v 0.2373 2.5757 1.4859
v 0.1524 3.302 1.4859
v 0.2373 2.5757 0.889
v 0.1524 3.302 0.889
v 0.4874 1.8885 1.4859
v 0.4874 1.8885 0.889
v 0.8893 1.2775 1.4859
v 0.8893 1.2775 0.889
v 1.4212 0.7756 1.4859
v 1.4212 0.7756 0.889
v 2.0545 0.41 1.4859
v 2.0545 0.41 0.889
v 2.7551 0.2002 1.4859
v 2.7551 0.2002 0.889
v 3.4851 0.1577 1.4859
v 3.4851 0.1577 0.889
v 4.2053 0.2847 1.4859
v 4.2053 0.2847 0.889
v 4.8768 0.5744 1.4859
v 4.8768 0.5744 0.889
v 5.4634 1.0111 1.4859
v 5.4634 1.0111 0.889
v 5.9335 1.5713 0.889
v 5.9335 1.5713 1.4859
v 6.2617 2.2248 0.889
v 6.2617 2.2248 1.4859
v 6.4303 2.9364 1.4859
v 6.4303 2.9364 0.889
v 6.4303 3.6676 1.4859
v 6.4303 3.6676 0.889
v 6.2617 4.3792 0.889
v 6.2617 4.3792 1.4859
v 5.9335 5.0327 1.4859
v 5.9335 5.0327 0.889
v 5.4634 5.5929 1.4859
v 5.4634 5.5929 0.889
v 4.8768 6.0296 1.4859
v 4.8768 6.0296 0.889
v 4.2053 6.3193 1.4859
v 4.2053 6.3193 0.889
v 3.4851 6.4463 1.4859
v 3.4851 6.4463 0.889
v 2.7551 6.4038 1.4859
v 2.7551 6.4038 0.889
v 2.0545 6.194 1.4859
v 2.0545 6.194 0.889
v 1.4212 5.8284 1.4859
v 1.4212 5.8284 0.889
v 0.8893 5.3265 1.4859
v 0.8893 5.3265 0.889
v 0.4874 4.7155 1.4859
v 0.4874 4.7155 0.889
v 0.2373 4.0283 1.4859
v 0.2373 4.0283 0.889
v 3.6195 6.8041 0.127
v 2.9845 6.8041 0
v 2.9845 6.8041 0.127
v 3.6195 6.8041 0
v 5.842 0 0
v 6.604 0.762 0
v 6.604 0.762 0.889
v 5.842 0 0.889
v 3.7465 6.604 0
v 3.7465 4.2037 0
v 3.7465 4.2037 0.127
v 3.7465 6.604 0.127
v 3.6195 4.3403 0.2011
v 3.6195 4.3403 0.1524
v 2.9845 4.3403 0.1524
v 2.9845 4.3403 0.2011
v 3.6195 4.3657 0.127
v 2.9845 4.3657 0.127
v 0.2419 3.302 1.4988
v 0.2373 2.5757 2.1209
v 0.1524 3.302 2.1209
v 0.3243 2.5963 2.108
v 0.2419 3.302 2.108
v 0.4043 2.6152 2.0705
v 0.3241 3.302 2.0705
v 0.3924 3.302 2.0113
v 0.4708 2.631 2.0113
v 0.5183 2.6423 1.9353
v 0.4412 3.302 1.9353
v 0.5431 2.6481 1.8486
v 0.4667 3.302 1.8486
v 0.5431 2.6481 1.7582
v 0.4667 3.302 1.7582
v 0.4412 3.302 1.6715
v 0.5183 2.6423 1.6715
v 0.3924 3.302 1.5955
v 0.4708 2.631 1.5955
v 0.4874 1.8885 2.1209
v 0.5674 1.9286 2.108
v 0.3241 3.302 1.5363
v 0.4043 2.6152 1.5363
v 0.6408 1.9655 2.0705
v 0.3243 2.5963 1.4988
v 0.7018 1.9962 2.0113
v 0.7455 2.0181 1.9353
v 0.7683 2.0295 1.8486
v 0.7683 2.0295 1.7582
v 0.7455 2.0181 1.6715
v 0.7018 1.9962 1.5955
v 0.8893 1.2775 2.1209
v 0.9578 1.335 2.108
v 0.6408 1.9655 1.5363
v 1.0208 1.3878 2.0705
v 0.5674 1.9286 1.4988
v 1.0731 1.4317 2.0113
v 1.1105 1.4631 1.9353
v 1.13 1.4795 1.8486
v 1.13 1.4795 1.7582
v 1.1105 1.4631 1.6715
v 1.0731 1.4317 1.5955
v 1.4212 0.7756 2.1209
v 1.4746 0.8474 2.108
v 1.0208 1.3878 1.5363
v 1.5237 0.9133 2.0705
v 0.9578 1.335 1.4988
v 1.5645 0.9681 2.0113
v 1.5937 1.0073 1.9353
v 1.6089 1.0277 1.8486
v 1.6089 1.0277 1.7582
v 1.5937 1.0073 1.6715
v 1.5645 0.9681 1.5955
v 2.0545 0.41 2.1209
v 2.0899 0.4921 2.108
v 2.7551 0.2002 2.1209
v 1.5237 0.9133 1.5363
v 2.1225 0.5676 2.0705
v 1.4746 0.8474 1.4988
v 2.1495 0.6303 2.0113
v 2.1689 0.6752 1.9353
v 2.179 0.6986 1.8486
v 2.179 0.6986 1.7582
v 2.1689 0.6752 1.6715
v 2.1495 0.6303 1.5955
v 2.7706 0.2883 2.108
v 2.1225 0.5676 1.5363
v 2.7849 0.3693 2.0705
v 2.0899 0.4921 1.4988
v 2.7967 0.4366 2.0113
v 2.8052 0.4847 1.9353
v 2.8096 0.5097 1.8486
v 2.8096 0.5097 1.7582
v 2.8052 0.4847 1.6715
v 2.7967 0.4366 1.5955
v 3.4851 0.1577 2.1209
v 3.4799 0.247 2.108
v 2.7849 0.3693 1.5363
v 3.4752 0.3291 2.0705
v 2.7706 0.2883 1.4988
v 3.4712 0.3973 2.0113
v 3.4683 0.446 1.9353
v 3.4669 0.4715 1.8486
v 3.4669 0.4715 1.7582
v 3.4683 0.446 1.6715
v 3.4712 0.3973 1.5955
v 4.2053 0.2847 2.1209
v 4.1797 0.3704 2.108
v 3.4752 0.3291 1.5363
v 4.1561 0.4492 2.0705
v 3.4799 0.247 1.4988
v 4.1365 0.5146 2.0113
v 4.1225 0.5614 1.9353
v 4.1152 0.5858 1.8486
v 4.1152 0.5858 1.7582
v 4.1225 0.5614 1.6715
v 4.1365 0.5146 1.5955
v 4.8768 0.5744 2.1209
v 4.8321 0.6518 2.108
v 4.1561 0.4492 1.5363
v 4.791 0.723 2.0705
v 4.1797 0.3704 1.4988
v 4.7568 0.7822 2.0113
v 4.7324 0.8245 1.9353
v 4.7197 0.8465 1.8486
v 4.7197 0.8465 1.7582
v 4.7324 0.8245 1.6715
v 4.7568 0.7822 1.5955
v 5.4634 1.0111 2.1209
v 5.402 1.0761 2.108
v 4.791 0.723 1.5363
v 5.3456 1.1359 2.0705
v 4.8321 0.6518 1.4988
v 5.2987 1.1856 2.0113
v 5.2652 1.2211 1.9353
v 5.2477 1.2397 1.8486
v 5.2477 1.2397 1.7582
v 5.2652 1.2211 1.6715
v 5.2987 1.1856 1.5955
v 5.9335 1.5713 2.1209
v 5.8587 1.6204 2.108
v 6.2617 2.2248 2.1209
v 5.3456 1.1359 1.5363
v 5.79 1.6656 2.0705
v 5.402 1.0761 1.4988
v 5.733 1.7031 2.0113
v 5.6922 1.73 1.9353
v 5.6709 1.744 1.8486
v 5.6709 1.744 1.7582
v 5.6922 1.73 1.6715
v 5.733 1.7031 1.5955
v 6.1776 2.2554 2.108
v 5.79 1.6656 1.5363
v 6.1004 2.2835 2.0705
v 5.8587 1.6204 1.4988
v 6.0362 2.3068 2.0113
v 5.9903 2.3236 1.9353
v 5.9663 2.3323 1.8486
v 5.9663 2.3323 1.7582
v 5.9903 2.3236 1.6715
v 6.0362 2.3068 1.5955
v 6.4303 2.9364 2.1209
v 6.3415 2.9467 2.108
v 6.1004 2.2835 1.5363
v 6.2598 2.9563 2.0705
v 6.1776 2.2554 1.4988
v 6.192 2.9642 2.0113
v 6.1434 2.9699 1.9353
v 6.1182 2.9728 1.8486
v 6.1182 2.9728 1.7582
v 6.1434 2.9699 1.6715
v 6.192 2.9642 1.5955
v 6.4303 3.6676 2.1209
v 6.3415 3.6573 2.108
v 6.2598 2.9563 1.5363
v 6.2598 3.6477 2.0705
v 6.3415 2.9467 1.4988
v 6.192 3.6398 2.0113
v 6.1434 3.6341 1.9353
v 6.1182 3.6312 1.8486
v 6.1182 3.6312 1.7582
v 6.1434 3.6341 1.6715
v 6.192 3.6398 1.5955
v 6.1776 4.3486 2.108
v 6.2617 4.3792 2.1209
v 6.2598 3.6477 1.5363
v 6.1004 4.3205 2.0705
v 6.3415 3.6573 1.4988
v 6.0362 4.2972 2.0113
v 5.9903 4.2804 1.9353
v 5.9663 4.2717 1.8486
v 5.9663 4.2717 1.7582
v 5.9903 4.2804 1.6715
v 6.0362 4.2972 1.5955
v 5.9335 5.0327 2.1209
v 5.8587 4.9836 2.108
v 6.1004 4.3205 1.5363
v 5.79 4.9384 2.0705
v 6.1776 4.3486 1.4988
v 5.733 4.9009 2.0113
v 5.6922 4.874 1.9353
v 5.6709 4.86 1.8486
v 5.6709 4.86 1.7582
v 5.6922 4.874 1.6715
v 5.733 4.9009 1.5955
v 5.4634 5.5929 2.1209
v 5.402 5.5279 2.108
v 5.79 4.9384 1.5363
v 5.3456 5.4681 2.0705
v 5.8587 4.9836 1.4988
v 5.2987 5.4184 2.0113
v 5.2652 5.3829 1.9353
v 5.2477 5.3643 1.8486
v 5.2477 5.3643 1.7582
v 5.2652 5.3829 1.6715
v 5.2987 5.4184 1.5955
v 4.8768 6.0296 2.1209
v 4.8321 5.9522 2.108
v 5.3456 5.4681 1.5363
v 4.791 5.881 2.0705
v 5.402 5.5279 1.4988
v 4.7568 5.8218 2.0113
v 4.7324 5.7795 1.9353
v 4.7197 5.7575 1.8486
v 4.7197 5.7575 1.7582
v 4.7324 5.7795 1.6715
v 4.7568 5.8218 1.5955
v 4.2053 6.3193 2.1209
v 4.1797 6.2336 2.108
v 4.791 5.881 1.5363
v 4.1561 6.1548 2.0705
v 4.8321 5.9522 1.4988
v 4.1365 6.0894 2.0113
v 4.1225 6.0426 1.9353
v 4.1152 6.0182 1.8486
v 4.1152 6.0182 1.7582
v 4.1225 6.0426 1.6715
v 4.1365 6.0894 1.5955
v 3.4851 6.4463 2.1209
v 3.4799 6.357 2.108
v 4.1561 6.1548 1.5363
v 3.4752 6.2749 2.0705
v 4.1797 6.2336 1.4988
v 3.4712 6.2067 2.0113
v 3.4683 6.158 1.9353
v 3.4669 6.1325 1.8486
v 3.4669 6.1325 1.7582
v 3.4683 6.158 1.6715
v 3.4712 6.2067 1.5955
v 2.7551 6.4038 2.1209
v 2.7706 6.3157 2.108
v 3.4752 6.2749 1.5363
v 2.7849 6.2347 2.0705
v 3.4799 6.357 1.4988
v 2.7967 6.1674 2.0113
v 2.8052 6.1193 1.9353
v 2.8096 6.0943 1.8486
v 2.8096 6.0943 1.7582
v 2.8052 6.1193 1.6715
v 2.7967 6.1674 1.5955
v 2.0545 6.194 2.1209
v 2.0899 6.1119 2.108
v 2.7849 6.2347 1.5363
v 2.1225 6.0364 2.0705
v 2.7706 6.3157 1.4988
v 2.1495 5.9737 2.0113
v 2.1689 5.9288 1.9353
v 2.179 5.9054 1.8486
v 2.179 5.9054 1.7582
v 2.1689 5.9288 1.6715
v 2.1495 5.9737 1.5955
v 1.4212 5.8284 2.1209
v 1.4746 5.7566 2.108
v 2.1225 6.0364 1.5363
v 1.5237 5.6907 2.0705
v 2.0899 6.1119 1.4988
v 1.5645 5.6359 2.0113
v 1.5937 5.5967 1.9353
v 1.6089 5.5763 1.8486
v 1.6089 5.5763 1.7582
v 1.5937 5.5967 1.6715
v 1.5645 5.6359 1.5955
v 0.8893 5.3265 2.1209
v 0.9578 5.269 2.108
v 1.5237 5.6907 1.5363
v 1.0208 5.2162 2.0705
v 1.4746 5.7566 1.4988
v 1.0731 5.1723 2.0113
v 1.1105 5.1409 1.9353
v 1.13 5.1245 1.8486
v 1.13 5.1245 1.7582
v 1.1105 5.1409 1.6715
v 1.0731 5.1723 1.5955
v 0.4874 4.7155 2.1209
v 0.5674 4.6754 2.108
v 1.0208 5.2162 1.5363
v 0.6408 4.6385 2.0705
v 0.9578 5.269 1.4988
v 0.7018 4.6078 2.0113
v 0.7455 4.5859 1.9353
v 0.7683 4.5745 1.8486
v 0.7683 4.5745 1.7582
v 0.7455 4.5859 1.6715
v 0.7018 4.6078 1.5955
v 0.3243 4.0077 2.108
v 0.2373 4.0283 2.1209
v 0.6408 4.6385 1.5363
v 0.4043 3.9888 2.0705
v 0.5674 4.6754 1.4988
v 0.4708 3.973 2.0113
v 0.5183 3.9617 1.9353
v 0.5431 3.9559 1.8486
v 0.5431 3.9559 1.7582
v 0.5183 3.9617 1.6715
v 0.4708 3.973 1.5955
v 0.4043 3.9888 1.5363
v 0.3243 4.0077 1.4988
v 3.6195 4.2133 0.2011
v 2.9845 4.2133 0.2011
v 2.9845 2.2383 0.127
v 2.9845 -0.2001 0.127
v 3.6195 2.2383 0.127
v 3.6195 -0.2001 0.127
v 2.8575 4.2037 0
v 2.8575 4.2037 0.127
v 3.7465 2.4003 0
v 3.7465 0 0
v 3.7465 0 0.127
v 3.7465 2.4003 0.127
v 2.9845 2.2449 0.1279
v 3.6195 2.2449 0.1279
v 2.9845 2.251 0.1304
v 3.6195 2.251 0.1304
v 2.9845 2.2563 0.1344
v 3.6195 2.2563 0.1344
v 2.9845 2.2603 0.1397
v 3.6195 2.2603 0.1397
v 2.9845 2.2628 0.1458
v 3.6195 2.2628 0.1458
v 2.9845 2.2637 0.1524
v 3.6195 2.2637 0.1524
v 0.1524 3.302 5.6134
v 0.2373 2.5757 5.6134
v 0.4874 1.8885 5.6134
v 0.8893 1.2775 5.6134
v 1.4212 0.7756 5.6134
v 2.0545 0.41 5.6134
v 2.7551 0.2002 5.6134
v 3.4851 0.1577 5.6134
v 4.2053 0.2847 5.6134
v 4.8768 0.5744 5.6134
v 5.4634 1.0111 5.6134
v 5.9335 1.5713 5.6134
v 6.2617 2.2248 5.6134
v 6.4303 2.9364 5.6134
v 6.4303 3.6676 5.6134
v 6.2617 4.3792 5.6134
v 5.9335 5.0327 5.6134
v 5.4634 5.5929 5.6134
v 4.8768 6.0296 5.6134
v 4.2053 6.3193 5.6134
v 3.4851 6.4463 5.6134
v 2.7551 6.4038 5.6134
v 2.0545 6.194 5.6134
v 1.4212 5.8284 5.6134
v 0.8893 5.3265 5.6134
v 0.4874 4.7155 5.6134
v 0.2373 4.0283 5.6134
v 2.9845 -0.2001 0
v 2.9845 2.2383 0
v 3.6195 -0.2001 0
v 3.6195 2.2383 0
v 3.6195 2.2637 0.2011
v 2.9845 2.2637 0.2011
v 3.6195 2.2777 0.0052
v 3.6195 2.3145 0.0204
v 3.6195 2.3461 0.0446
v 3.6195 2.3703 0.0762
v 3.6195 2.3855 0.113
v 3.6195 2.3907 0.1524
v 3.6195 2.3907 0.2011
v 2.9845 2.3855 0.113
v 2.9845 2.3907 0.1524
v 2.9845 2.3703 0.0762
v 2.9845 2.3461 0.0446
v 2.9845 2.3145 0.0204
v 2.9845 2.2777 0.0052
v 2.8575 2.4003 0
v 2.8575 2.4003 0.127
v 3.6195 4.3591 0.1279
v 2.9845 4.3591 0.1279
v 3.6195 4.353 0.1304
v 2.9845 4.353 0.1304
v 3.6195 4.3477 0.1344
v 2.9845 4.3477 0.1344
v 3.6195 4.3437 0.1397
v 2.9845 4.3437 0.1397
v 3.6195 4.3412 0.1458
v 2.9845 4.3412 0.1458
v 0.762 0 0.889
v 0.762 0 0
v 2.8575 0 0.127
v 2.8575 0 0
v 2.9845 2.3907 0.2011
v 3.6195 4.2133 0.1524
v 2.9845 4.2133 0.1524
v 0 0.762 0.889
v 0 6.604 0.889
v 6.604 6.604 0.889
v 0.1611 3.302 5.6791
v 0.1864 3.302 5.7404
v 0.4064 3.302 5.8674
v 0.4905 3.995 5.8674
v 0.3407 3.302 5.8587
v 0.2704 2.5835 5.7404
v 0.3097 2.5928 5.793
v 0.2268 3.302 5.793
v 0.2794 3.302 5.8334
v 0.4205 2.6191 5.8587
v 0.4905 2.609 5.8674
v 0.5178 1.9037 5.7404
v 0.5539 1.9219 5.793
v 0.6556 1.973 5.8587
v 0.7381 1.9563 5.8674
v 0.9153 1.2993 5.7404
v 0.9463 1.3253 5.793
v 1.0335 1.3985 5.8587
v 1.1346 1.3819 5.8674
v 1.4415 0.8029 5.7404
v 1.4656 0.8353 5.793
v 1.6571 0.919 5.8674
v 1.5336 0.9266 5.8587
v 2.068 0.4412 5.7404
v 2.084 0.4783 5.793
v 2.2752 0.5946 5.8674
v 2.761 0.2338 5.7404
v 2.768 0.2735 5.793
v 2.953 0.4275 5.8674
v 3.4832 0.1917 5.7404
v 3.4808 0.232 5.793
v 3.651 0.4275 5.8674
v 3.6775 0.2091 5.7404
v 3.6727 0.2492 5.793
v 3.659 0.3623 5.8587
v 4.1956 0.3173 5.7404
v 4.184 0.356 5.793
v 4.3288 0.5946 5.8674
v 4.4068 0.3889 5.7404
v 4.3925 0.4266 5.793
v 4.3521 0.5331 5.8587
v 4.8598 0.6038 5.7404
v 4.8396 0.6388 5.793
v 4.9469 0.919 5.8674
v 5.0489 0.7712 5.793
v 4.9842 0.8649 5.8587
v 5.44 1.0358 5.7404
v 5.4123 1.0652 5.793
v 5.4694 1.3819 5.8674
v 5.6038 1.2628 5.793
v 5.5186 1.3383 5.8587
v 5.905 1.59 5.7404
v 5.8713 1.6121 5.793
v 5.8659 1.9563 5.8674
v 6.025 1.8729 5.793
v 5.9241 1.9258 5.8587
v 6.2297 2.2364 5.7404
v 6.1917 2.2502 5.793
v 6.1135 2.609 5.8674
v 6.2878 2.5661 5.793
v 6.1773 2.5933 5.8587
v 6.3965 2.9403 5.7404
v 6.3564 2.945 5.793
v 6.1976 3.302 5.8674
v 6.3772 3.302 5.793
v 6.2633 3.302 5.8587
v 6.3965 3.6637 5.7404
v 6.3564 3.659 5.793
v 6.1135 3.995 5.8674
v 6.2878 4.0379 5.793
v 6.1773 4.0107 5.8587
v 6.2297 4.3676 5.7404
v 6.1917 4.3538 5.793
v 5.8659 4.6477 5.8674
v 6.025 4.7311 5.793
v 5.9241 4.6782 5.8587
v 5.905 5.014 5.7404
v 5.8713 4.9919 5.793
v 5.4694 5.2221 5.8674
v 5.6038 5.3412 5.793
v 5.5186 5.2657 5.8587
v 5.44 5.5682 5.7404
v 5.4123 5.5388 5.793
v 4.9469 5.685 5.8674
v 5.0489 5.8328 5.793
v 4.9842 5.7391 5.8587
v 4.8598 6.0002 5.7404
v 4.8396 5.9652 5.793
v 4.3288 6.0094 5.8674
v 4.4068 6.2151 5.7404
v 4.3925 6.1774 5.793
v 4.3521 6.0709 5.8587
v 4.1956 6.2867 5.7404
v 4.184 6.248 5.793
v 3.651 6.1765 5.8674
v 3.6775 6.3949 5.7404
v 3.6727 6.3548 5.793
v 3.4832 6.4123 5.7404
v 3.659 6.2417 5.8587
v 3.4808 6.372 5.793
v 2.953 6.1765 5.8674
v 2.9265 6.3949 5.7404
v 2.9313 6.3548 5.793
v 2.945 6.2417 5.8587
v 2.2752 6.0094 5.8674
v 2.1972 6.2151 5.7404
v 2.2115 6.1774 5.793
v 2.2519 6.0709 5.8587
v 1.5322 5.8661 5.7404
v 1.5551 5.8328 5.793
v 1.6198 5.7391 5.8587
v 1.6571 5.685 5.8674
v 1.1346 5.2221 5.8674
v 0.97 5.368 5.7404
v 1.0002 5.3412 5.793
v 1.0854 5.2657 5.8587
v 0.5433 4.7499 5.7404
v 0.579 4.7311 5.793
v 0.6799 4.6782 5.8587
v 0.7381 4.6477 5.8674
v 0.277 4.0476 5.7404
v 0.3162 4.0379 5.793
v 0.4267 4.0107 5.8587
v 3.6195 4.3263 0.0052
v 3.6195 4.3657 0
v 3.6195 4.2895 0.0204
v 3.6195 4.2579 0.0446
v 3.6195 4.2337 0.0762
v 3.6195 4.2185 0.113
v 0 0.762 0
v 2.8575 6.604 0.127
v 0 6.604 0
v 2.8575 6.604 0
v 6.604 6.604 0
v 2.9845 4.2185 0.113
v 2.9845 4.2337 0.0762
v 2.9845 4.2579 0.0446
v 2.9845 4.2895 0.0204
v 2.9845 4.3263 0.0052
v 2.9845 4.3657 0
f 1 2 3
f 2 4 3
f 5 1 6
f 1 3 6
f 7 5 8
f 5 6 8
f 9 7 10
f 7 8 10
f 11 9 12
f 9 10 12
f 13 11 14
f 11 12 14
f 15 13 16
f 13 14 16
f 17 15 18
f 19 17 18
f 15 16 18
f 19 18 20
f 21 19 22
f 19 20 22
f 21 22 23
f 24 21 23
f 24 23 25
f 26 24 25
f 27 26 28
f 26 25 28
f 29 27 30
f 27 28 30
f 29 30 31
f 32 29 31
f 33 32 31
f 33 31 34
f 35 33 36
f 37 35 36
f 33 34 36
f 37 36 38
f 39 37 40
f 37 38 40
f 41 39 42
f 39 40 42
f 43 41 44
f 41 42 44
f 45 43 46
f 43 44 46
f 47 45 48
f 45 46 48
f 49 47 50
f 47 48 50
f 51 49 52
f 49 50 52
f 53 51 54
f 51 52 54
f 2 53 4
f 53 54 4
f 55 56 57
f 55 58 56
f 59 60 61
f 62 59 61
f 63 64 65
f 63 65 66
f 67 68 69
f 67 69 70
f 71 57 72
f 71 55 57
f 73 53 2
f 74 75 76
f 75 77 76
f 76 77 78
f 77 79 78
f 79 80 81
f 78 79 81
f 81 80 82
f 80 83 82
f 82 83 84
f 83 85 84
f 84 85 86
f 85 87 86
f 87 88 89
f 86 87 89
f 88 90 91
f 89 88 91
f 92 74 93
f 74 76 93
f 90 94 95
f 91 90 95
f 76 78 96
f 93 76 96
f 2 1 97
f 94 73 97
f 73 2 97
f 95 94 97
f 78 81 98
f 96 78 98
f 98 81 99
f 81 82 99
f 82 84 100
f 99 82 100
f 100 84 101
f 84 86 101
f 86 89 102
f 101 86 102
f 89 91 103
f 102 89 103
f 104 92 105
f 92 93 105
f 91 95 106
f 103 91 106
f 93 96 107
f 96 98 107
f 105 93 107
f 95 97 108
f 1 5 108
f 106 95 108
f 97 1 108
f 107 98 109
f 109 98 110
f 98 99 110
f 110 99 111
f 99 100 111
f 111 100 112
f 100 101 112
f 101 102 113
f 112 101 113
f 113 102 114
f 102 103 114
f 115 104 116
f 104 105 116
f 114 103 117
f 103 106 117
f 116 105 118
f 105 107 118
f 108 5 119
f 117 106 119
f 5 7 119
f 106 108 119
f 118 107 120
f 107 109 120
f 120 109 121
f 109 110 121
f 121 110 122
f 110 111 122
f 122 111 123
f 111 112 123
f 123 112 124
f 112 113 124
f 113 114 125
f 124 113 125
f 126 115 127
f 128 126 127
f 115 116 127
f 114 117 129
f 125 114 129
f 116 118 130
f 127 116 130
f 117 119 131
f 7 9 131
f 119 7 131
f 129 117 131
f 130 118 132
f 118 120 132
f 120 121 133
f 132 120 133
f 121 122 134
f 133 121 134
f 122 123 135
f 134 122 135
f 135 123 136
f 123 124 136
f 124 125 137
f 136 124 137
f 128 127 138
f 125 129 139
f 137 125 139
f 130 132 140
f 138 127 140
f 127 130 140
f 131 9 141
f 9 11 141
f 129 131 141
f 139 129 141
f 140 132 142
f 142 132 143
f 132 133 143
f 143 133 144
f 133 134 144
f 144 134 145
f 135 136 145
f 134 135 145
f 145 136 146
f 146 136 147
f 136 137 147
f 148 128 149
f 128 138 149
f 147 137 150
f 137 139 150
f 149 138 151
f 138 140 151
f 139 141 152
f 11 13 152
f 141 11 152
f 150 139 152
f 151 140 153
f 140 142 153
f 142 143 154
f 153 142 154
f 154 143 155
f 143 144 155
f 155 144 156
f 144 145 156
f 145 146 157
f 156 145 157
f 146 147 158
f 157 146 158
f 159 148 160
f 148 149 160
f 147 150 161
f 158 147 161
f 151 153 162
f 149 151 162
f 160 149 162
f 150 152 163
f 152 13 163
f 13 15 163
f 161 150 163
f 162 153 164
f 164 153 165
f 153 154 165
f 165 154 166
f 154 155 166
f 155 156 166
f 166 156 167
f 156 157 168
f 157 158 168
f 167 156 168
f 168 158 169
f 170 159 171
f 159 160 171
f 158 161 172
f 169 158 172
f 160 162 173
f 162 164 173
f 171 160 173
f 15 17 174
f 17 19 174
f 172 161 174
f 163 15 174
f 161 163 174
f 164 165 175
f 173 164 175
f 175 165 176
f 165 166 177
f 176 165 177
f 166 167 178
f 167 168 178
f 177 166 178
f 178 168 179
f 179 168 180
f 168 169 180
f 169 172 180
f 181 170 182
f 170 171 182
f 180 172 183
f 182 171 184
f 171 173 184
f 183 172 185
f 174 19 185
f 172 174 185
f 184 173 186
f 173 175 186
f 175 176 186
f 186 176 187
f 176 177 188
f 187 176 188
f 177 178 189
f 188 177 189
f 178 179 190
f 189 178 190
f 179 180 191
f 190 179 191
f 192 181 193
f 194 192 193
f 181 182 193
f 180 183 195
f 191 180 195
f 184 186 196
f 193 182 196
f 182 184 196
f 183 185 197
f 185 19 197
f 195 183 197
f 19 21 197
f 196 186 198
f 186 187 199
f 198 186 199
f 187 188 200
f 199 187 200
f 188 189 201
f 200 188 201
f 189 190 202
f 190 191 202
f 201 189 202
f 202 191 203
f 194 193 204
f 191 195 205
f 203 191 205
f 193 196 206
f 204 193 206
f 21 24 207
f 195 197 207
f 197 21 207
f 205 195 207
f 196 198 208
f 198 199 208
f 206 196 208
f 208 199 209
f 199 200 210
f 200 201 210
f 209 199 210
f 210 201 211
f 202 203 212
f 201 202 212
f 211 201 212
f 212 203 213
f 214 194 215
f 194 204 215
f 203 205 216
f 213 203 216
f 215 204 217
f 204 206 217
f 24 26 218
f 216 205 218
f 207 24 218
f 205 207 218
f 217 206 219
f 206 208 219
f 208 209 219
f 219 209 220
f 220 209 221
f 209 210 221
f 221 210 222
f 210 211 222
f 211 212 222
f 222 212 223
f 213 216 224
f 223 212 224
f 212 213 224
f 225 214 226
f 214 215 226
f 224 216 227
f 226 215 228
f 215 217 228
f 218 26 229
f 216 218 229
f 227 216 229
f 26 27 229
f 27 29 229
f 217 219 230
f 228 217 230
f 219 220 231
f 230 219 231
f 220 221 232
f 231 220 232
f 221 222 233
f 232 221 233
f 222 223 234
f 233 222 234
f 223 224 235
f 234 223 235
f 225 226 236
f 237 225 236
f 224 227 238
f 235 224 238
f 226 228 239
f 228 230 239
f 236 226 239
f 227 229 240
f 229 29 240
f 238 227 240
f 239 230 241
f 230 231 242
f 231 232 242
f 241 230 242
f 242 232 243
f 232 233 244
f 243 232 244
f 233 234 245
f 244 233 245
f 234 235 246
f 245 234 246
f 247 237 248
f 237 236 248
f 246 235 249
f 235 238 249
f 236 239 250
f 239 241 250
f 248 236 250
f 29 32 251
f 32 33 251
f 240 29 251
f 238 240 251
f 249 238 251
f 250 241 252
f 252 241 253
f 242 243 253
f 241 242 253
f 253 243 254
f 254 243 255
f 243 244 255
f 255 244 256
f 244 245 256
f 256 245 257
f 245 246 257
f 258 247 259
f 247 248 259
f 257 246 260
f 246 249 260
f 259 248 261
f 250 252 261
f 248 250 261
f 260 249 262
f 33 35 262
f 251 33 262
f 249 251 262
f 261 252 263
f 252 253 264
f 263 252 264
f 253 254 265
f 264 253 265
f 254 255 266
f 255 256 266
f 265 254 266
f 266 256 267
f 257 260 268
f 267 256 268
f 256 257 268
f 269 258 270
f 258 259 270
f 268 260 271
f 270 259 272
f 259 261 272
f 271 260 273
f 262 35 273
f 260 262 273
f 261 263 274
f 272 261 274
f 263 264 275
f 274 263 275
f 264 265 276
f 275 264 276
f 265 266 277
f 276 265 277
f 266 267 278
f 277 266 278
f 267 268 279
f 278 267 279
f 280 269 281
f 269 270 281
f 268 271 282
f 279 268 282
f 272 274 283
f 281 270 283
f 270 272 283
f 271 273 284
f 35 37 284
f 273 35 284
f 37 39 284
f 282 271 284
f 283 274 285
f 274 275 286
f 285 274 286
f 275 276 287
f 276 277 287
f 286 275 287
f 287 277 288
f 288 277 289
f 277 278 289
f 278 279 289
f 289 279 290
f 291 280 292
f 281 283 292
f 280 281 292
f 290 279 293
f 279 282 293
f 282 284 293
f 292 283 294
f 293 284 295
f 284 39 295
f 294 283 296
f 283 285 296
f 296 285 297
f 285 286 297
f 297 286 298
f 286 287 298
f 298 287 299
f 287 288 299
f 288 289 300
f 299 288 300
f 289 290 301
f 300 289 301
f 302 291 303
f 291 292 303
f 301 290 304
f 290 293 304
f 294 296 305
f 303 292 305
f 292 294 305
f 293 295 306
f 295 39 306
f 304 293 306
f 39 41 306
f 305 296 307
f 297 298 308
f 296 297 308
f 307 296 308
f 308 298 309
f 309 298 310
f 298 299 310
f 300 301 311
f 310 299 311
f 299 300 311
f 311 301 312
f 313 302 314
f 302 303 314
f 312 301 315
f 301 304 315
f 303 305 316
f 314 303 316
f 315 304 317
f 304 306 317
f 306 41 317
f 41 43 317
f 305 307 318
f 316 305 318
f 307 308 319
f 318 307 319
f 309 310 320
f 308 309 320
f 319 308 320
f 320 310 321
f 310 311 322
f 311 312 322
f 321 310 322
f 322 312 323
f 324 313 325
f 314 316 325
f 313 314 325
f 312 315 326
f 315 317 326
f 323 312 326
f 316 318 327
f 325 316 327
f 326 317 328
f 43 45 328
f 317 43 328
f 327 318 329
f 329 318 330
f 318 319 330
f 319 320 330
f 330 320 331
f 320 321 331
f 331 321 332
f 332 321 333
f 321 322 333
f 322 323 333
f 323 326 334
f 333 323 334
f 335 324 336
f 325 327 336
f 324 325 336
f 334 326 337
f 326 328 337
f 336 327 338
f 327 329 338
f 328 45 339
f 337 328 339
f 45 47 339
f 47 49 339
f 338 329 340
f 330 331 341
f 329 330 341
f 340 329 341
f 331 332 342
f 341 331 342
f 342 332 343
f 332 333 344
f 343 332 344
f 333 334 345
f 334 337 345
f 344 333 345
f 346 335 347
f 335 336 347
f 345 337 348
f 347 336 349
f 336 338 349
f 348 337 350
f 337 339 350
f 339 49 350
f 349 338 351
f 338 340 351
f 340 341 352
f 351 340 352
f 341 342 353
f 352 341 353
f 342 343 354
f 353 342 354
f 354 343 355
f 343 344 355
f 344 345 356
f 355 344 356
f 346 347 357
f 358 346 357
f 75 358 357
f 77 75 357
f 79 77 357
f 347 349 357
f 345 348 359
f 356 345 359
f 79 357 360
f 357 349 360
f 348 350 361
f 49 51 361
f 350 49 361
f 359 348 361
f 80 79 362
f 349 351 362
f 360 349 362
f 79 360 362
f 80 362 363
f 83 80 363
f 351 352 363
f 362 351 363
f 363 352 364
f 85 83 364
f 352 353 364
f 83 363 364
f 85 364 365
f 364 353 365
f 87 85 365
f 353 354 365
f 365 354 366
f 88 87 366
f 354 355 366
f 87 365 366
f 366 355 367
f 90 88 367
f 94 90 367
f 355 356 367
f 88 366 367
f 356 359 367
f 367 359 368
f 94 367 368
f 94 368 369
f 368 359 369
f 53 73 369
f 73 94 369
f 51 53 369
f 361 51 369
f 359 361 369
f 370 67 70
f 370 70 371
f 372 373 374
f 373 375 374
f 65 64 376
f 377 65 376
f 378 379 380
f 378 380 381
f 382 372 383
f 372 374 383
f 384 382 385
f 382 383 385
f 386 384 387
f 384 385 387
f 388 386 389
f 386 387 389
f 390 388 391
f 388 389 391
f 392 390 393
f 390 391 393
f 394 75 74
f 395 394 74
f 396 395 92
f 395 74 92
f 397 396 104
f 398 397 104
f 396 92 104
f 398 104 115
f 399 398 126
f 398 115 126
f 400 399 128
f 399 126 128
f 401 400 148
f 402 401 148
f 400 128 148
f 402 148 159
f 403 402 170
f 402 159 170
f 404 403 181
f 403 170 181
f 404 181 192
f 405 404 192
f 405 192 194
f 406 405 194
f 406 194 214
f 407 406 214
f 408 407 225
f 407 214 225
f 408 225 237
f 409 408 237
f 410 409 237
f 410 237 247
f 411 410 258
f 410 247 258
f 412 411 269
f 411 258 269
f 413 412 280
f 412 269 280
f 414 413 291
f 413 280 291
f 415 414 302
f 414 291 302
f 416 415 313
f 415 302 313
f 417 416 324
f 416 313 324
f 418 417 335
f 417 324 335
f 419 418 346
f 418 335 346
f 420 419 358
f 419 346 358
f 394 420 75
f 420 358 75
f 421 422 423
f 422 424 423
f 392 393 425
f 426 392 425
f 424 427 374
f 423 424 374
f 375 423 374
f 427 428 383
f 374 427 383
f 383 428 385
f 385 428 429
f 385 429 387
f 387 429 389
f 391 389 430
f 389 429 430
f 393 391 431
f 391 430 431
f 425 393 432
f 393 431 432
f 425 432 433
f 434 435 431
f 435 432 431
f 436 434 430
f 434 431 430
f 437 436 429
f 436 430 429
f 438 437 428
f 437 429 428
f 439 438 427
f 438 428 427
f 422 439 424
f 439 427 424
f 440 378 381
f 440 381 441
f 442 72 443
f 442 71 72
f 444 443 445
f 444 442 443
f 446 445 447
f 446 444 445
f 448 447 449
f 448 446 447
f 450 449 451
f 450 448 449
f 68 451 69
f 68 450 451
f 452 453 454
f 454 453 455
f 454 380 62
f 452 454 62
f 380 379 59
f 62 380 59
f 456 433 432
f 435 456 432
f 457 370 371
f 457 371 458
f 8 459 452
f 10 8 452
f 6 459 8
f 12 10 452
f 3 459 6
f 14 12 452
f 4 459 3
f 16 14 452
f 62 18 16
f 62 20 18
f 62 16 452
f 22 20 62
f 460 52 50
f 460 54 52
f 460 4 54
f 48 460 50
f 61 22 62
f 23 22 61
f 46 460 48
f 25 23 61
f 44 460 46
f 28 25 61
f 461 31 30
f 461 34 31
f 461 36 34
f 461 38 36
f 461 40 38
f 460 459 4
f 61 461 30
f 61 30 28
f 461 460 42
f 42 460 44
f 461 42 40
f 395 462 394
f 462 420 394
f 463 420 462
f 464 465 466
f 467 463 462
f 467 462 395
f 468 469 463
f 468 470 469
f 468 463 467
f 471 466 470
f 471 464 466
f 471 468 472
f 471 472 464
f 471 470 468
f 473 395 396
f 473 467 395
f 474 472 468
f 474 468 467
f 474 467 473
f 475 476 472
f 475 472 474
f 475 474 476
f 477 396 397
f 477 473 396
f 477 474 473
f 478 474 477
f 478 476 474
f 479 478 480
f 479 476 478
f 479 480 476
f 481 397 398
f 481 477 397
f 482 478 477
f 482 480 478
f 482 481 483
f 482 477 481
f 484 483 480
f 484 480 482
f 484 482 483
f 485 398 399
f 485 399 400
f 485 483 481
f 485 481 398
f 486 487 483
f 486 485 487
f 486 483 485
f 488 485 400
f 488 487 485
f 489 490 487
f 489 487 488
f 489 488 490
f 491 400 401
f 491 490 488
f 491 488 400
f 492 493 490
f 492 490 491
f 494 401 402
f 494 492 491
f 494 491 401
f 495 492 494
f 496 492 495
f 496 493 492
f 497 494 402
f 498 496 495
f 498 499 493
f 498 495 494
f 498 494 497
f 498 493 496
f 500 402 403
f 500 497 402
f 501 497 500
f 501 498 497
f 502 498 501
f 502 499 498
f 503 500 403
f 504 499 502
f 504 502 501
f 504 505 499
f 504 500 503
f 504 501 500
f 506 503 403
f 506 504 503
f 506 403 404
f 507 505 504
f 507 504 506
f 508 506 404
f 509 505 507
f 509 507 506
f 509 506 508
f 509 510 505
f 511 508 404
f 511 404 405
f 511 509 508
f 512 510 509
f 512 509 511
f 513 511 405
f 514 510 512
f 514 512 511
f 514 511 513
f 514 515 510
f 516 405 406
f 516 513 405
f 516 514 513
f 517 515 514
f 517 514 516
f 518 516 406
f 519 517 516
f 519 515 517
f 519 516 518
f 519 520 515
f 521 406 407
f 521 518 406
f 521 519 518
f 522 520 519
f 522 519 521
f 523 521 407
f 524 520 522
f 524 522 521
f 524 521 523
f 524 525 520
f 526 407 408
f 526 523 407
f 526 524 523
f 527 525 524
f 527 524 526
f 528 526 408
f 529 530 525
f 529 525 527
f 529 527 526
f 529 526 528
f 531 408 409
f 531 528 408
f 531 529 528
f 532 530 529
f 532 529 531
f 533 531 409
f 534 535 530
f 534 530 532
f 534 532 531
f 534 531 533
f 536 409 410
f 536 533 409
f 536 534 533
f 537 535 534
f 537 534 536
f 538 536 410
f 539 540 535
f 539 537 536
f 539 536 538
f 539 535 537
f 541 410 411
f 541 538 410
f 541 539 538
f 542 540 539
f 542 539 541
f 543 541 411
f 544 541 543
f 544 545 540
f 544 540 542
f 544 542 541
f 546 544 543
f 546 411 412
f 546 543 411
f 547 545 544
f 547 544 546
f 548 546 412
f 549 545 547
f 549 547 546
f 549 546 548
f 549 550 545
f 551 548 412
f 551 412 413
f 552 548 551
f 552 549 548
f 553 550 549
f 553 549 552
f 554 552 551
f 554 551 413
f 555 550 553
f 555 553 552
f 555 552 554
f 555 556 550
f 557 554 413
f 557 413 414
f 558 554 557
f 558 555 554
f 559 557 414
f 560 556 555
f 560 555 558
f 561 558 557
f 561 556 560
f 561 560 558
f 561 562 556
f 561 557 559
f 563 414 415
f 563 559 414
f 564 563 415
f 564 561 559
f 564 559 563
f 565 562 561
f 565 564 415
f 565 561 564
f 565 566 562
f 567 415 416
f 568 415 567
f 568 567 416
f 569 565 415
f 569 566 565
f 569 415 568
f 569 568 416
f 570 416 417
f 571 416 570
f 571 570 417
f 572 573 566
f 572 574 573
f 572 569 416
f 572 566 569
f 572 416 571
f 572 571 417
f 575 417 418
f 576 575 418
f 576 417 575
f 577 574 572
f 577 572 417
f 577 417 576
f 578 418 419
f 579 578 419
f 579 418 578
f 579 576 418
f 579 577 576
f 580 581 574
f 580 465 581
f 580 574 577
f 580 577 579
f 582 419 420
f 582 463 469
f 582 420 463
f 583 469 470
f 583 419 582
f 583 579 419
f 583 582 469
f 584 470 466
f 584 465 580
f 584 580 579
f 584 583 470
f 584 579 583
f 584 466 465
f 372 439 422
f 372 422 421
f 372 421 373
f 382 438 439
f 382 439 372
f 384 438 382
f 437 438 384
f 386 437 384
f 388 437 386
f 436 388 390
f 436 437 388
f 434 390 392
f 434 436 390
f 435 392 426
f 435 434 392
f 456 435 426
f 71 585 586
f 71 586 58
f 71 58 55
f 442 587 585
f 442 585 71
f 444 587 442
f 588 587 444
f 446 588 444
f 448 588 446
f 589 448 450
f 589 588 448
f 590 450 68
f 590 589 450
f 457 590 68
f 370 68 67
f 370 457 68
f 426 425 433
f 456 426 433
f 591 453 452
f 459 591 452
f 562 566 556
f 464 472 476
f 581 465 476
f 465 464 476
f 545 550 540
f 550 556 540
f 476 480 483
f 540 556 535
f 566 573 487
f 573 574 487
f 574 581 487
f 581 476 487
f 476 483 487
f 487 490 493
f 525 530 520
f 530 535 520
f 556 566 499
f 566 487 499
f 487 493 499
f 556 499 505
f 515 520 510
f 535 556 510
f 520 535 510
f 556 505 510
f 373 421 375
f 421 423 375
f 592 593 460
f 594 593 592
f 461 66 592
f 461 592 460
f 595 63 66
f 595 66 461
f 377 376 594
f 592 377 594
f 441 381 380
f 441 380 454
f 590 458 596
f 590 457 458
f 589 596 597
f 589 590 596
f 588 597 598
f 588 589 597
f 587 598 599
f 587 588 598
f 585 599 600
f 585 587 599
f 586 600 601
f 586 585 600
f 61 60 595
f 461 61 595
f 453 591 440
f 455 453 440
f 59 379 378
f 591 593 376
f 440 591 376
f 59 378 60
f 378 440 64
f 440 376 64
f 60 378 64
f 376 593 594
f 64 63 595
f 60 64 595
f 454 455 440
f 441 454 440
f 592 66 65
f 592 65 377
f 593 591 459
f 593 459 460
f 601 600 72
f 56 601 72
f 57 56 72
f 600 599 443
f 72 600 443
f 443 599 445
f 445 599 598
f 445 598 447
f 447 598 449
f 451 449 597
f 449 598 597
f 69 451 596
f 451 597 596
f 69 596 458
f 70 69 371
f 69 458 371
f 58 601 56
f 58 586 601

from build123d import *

# Parameters (mm, degrees)
SKETCH1_W           = 6.604
SKETCH1_H           = 6.604
BOSS_EXTRUDE1_DEPTH = 0.889
FILLET1_R           = 0.254
CHAMFER1_SIZE       = 0.762
SKETCH4_W           = 0.889
SKETCH4_H           = 2.4003
CUT_EXTRUDE1_DEPTH  = 0.127
BASE_FLANGE1_DEPTH  = 0.3175


# Sheet-metal steps are written as plain solids
with BuildPart() as part:
    # Sketch1 → Boss-Extrude1 (new body)
    with BuildSketch(Plane.XY):
        with Locations((3.302, 3.302)):
            Rectangle(SKETCH1_W, SKETCH1_H)
    extrude(amount=BOSS_EXTRUDE1_DEPTH)

    # Sketch2 → Revolve1 (revolve)
    with BuildSketch(Plane(origin=(3.302, 0, 0), x_dir=(0, 0, -1), z_dir=(1, 0, 0)), mode=Mode.PRIVATE) as revolve1_sk:
        with BuildLine():
            Line((-0.889, 3.302), (-5.8674, 3.302))
            Line((-5.8674, 3.302), (-5.8674, 6.4516))
            Line((-5.8674, 6.4516), (-2.1209, 6.4516))
            ThreePointArc((-2.1209, 6.4516), (-1.8034, 6.1341), (-1.4859, 6.4516))
            Line((-1.4859, 6.4516), (-0.889, 6.4516))
            Line((-0.889, 6.4516), (-0.889, 3.302))
        make_face()
    revolve(revolve1_sk.sketch.rotate(Axis((3.302, 3.302, -6.0452), (0, 0, 1)), 90), axis=Axis((3.302, 3.302, -6.0452), (0, 0, 1)))

    # Fillet1
    fillet1_edges = [part.edges().sort_by_distance(p)[0] for p in [
        (6.4516, 3.302, 5.8674),
    ]]
    fillet(fillet1_edges, radius=FILLET1_R)

    # Chamfer1
    chamfer1_edges = [part.edges().sort_by_distance(p)[0] for p in [
        (6.604, 0, 0.4445),
        (0, 0, 0.4445),
    ]]
    chamfer(chamfer1_edges, length=CHAMFER1_SIZE)

    # Sketch4 → Cut-Extrude1 (cut)
    with BuildSketch(Plane(origin=(0, 0, 0), x_dir=(-1, 0, 0), z_dir=(0, 0, -1))):
        with Locations((-3.302, 5.40385)):
            Rectangle(SKETCH4_W, SKETCH4_H)
        with Locations((-3.302, 1.20015)):
            Rectangle(SKETCH4_W, SKETCH4_H)
    extrude(amount=-CUT_EXTRUDE1_DEPTH, mode=Mode.SUBTRACT)


with BuildPart() as body_2:
    # Sketch5 → Base-Flange1 (new, symmetric)
    with BuildSketch(Plane(origin=(3.302, 0, 0), x_dir=(0, 0, -1), z_dir=(1, 0, 0))):
        with BuildLine():
            Line((-0.201114098, 2.390695998), (-0.1524, 2.390695998))
            ThreePointArc((-0.1524, 2.390695998), (-0.044636927, 2.346059072), (0, 2.238295998))
            Line((0, 2.238295998), (0, -0.200104002))
            Line((0, -0.200104002), (-0.127, -0.200104002))
            Line((-0.127, -0.200104002), (-0.127, 2.238295998))
            ThreePointArc((-0.127, 2.238295998), (-0.134439488, 2.25625651), (-0.1524, 2.263695998))
            Line((-0.1524, 2.263695998), (-0.201114098, 2.263695998))
            Line((-0.201114098, 2.263695998), (-0.201114098, 2.390695998))
        make_face()
    extrude(amount=BASE_FLANGE1_DEPTH, both=True)


with BuildPart() as body_3:
    # Mirror1: mirrored copy
    add(body_2.part.mirror(Plane(origin=(0, 3.302, 0), x_dir=(0, 0, 1), z_dir=(0, -1, 0))))


solid = Compound([part.part, body_2.part, body_3.part])
